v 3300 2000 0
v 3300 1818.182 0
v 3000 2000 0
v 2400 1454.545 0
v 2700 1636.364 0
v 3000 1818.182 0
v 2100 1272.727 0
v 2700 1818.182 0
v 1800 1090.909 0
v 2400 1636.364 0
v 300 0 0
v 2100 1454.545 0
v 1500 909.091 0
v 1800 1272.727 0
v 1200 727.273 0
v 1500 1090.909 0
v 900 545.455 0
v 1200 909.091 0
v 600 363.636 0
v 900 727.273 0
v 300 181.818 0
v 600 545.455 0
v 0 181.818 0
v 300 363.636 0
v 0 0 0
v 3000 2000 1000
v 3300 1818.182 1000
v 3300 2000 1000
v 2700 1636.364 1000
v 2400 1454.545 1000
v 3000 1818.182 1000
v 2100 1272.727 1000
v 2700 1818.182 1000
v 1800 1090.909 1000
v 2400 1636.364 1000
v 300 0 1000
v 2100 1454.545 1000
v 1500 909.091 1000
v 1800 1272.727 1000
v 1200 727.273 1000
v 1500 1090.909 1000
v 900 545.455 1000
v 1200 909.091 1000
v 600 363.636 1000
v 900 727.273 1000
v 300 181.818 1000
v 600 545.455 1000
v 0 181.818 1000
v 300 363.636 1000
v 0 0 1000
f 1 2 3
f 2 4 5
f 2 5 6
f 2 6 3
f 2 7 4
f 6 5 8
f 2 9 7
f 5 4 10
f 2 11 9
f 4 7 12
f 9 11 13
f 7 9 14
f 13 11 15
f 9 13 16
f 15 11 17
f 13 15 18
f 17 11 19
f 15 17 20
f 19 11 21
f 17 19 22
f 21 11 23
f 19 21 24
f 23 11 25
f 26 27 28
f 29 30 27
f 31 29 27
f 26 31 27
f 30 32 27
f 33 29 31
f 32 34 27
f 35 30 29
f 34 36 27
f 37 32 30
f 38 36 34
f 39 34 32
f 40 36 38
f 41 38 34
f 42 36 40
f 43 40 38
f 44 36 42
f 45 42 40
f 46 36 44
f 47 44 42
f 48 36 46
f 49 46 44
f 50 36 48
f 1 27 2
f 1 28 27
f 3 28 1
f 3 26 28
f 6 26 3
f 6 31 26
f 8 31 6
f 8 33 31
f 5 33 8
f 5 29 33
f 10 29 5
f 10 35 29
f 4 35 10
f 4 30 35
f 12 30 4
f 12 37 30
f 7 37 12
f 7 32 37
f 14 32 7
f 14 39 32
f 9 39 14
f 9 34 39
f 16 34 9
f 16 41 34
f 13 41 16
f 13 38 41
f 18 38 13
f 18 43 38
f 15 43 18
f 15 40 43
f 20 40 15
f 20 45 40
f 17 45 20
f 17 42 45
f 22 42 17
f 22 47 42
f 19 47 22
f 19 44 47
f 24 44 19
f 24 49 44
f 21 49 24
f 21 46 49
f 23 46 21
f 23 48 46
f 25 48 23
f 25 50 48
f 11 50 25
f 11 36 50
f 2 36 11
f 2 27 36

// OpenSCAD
module stairs_simple(h, t, b) 
    let(
        anzahl = round(h/180), 
        stufentiefe = min(300, t/anzahl), 
        stufenhoehe = h/anzahl, 
        stufe_unten = [for (i=[0:anzahl]) [i*stufentiefe,stufenhoehe*i]], 
        stufe_oben = [for (i=[0:anzahl]) [i*stufentiefe, stufenhoehe*(i+1)]] 
    ) 

    linear_extrude(b) 
        polygon(points = [
            for (i= [0:(len(stufe_unten) + len(stufe_oben)-2)]) 
                (i % 2 == 0) ? stufe_unten[i/2] : stufe_oben[i/2],
            [anzahl*stufentiefe,(anzahl-1)*stufenhoehe],
            [stufentiefe, 0],
        ]);

stairs_simple(h=2000, t=5000, b=1000);
